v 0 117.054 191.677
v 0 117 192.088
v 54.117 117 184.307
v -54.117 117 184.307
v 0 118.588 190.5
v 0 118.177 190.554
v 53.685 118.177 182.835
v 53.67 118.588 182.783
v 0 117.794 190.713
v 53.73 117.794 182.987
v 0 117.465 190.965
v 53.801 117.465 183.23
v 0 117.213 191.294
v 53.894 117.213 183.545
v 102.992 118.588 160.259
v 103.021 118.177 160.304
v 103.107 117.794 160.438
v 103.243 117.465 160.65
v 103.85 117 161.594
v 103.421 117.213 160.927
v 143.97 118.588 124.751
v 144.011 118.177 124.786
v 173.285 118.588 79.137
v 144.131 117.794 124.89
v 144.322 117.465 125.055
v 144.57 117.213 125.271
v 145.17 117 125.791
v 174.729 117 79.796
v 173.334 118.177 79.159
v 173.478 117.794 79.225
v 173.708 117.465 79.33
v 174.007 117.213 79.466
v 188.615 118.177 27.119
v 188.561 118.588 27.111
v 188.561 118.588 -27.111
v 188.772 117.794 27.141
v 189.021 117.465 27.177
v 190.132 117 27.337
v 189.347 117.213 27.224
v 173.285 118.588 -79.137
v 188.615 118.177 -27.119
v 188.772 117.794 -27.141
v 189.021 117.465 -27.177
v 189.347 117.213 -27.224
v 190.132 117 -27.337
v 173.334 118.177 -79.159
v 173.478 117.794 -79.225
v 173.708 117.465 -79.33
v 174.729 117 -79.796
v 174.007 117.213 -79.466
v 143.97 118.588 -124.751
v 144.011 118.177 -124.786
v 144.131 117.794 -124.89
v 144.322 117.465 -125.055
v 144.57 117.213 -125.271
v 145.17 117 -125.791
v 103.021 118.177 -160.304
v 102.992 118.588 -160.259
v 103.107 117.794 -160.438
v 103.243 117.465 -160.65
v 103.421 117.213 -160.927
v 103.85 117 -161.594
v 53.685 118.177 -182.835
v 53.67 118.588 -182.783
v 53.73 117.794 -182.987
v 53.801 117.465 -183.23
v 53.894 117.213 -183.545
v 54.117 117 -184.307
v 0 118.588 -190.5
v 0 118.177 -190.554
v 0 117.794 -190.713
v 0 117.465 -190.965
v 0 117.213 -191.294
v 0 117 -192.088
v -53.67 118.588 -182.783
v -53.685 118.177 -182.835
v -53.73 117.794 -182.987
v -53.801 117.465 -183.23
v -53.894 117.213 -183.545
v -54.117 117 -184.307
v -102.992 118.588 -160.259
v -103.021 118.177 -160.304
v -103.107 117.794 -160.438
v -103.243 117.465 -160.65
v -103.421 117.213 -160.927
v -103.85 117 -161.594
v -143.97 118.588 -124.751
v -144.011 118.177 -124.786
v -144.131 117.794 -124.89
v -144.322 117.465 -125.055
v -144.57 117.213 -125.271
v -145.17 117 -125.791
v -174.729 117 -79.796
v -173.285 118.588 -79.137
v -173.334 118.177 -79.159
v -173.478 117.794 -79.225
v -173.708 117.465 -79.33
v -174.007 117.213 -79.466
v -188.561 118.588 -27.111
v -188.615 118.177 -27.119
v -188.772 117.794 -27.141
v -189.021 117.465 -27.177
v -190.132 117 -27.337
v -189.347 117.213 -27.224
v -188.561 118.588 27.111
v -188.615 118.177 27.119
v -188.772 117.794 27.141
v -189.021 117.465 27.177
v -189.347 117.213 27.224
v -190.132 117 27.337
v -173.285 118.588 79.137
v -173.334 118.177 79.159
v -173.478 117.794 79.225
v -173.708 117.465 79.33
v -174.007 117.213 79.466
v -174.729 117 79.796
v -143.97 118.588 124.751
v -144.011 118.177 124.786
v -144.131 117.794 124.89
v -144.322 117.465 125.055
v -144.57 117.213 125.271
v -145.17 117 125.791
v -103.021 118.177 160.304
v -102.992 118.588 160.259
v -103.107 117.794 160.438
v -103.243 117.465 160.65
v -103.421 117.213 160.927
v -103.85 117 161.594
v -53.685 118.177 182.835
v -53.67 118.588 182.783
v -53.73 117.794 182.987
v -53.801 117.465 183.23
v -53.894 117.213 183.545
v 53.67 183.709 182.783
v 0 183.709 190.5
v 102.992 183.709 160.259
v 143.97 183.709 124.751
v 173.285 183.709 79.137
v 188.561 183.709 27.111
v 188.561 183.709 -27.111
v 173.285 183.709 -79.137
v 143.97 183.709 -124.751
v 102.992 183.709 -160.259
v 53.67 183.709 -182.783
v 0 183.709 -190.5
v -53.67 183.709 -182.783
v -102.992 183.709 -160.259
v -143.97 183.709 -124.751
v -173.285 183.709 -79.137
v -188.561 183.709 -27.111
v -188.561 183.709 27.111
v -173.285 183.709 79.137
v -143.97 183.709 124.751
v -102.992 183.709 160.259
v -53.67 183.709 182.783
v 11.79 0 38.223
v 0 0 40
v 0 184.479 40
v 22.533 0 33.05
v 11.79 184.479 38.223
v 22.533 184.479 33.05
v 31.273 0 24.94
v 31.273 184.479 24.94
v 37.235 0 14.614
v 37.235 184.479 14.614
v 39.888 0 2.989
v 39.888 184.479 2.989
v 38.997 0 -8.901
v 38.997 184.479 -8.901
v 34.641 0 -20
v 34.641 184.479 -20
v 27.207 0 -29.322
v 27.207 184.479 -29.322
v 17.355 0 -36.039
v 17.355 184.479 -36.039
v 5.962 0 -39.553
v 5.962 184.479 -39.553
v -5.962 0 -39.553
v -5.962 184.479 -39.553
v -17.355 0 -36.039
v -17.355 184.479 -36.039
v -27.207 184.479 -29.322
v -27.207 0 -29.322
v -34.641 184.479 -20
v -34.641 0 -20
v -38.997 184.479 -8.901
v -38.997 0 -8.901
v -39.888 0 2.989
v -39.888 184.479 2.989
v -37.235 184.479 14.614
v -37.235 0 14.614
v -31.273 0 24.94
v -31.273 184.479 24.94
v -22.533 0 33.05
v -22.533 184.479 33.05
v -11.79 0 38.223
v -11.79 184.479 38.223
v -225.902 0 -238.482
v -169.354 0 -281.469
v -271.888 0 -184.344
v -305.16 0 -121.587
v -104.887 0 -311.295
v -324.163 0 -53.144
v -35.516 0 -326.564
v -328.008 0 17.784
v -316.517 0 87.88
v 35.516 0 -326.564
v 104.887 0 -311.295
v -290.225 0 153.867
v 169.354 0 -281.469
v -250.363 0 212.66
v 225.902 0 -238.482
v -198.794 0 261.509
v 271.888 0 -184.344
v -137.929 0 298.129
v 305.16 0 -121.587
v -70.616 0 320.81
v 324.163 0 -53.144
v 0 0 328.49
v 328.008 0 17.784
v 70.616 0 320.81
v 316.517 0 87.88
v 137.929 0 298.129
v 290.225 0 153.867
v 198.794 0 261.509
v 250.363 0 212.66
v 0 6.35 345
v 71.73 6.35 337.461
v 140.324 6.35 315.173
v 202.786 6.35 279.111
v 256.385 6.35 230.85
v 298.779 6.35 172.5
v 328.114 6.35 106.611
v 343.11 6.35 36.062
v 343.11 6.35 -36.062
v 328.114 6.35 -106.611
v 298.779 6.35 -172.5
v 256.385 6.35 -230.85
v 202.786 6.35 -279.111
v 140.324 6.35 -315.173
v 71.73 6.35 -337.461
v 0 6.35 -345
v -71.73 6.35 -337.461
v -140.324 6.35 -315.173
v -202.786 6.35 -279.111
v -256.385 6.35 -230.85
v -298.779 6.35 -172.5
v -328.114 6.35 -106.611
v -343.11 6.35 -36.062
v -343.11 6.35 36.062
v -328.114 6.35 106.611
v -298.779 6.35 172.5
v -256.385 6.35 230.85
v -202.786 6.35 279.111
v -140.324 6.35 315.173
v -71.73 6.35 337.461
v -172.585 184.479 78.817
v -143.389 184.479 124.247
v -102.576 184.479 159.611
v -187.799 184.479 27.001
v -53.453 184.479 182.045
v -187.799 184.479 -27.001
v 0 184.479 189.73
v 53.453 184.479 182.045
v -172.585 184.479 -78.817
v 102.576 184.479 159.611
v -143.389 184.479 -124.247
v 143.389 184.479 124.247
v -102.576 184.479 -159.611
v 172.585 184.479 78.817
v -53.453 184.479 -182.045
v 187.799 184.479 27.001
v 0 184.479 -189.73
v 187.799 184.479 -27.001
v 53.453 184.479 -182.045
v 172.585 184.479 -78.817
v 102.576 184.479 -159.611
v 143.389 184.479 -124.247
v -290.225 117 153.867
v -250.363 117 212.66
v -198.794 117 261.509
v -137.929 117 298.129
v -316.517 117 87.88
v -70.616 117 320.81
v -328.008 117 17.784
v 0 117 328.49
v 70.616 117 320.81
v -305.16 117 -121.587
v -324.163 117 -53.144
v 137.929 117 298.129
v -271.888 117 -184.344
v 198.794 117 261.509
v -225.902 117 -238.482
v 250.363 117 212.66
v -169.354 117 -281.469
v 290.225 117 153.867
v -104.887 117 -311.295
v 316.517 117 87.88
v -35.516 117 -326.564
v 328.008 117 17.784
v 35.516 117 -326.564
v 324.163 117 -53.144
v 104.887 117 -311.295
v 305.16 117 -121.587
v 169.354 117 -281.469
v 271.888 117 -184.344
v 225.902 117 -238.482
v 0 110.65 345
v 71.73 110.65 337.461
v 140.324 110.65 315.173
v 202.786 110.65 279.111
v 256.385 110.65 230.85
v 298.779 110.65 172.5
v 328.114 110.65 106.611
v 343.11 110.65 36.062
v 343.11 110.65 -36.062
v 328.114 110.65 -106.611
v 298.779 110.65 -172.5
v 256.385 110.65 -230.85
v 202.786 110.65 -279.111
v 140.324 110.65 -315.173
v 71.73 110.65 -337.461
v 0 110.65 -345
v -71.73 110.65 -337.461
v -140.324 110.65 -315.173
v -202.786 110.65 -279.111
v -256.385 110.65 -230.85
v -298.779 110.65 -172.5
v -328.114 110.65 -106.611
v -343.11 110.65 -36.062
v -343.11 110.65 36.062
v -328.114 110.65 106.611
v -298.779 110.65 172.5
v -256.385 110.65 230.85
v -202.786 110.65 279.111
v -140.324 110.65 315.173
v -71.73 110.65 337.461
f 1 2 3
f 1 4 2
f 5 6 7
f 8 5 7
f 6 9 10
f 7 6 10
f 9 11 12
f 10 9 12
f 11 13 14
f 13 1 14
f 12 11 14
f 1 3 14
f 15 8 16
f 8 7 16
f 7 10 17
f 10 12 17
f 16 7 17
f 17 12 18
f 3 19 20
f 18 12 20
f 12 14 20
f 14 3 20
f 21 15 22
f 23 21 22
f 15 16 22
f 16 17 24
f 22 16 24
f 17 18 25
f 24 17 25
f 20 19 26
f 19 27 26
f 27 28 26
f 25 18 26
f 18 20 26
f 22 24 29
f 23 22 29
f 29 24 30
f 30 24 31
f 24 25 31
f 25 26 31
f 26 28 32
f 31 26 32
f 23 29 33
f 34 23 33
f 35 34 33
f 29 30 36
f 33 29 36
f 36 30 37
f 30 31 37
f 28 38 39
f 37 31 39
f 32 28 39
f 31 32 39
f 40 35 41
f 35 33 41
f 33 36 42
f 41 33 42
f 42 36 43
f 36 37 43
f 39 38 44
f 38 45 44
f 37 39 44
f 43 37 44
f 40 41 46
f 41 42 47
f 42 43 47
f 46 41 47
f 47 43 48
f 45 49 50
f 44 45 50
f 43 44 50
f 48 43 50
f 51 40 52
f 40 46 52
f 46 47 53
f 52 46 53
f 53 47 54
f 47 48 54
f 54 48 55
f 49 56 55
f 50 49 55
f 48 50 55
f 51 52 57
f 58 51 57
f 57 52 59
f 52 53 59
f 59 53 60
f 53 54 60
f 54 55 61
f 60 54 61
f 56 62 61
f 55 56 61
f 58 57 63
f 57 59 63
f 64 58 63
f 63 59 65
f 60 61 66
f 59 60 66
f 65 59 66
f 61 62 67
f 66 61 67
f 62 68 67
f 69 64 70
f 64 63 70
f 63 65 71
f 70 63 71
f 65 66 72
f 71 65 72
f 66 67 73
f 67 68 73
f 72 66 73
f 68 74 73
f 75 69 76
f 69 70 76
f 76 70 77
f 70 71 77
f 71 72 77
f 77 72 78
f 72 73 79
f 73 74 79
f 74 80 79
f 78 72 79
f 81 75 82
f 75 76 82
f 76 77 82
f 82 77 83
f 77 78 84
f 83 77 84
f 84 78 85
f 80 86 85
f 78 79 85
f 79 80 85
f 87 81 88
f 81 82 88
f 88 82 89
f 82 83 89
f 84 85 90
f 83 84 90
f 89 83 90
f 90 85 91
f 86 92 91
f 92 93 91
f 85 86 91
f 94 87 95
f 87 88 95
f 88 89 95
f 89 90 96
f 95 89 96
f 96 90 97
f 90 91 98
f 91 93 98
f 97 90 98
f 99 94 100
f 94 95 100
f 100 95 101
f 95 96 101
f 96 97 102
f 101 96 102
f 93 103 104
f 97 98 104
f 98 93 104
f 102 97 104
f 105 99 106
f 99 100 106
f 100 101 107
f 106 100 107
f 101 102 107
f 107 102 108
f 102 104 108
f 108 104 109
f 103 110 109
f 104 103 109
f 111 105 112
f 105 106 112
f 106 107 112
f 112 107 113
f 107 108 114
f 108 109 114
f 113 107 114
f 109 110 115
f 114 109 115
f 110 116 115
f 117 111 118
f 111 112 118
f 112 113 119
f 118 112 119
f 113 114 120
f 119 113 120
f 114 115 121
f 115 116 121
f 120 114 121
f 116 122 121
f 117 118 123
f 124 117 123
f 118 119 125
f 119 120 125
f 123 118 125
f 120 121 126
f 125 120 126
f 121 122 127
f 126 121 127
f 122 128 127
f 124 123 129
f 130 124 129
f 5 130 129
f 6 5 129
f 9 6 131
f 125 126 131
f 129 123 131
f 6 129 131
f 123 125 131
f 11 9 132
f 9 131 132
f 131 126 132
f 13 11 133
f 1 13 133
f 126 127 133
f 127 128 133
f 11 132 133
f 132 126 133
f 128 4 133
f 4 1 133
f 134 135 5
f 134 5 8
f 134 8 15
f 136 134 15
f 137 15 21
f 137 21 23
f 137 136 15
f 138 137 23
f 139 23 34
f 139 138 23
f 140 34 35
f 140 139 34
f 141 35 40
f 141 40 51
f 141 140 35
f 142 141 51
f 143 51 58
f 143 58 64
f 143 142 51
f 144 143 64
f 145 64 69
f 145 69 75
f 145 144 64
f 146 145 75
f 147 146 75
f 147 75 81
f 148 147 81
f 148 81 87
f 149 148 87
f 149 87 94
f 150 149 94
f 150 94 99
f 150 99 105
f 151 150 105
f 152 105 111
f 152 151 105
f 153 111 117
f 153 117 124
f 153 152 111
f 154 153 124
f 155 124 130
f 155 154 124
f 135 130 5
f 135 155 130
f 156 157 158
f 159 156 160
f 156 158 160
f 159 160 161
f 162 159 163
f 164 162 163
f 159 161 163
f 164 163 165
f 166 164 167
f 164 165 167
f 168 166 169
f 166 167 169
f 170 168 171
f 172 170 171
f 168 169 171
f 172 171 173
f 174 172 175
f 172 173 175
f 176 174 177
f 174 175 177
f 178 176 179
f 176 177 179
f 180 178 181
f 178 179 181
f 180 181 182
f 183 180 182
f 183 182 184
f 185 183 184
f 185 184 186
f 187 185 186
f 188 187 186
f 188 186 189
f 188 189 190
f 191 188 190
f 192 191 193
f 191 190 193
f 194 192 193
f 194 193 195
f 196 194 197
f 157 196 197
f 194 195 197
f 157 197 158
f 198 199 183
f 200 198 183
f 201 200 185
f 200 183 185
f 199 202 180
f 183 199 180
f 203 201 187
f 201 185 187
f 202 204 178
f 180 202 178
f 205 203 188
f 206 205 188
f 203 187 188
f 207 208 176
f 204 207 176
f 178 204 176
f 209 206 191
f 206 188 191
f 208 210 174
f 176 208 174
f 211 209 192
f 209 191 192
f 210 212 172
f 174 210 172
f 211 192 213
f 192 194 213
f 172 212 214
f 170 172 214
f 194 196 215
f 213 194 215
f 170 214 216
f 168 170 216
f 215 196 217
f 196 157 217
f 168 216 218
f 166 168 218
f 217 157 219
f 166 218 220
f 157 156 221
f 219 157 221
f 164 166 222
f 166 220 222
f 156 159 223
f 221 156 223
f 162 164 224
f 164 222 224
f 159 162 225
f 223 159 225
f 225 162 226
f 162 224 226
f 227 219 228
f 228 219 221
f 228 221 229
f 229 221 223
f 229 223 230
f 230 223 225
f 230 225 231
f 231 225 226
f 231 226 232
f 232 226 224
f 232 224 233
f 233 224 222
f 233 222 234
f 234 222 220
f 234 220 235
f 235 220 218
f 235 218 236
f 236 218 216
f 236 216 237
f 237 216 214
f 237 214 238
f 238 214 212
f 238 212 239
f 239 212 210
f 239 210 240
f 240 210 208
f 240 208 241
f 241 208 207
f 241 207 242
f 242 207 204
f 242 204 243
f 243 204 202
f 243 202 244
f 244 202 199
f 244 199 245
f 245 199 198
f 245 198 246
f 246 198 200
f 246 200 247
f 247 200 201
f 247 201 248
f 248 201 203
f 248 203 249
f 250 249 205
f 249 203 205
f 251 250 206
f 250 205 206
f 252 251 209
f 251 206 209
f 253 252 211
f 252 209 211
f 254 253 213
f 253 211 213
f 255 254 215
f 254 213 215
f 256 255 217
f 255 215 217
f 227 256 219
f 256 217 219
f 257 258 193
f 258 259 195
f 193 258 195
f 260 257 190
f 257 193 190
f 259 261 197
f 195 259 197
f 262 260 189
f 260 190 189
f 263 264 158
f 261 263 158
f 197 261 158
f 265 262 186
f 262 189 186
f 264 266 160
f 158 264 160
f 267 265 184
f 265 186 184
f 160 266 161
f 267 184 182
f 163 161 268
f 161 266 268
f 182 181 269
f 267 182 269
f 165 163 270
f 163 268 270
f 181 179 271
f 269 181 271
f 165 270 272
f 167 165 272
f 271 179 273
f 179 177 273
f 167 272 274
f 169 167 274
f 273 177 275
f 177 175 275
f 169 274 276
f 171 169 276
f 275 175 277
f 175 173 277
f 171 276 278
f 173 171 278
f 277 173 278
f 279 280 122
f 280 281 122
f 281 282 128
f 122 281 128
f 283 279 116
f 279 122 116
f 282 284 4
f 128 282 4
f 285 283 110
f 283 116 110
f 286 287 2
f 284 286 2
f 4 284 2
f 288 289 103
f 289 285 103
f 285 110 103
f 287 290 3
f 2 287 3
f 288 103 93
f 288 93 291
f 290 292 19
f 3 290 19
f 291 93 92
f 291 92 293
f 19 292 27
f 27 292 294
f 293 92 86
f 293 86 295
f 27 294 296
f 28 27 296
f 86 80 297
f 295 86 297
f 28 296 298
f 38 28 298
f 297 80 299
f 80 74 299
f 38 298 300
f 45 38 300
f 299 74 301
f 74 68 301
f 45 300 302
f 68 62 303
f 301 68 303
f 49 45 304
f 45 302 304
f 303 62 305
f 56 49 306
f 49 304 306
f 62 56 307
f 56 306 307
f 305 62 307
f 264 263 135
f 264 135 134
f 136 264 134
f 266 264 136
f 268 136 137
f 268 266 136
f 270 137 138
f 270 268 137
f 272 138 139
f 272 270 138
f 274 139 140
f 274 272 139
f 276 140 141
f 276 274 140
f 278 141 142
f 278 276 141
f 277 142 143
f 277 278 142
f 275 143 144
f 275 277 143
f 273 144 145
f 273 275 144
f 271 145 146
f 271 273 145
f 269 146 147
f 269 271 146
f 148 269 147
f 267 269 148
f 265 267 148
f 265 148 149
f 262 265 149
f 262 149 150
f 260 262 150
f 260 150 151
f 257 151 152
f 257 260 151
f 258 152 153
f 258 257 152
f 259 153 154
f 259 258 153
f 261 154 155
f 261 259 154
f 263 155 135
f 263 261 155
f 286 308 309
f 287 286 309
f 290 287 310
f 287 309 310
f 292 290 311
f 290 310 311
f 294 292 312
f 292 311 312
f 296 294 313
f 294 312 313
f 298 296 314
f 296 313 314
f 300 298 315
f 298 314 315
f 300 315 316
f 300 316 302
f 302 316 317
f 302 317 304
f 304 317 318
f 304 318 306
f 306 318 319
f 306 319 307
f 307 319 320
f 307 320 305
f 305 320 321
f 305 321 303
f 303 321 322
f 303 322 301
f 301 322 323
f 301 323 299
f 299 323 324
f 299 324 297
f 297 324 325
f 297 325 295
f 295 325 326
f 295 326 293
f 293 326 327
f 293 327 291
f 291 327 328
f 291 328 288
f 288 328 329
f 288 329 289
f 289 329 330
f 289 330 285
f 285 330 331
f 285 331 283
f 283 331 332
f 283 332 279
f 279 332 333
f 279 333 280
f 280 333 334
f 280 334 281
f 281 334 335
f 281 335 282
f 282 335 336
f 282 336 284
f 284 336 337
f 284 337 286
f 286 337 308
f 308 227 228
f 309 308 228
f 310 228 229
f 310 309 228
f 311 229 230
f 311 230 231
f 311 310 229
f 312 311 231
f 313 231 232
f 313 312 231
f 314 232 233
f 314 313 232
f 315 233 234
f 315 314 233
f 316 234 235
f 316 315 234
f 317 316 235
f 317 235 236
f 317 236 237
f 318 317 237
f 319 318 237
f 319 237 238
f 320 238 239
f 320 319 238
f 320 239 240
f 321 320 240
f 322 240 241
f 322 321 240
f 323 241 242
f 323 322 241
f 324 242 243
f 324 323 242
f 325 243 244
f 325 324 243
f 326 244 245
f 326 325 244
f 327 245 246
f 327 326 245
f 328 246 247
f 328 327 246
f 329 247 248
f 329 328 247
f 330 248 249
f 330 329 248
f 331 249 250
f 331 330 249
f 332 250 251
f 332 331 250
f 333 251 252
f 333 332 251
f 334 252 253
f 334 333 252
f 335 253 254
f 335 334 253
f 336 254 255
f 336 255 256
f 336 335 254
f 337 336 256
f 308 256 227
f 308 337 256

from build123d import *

# Parameters (mm, degrees)
F0_W        = 117
F0_H        = 154.5
F0_H_2      = 150.5
F0_W_2      = 67.4791876724
F2_R        = 1.5875
F3_SIZE     = 0.7696969697
F4_C1_SIZE2 = 6.35
F4_C1_SIZE  = 16.51
F4_C2_SIZE2 = 16.51
F4_C2_SIZE  = 6.35


with BuildPart() as f1:
    # F0 (on Right) → F1 (revolve)
    with BuildSketch(Plane.YZ):
        with Locations((58.5, 267.75)):
            Rectangle(F0_W, F0_H)
        with Locations((58.5, 115.25)):
            Rectangle(F0_W, F0_H_2)
        with Locations((150.7395938362, 115.25)):
            Rectangle(F0_W_2, F0_H_2)
    revolve(axis=Axis((0, 115.410885826, 0), (0, 1, 0)))

    # F2
    f2_edges = [f1.edges().sort_by_distance(p)[0] for p in [
        (0, 117, -190.5),
    ]]
    fillet(f2_edges, radius=F2_R)

    # F3
    f3_edges = [f1.edges().sort_by_distance(p)[0] for p in [
        (0, 184.479188, -190.5),
    ]]
    chamfer(f3_edges, length=F3_SIZE)

    # F4: chamfer of 6.35 x 16.51 on 4 edges, made by hand

    # F4_c1
    f4_c1_edges = [f1.edges().sort_by_distance(p)[0] for p in [
        (0, 117, -345),
    ]]
    f4_c1_side = f1.faces().sort_by_distance((0, 117, -344.873))[0]
    chamfer(f4_c1_edges, length=F4_C1_SIZE, length2=F4_C1_SIZE2, reference=f4_c1_side)

    # F4_c2
    f4_c2_edges = [f1.edges().sort_by_distance(p)[0] for p in [
        (0, 0, -345),
    ]]
    f4_c2_side = f1.faces().sort_by_distance((0, 0.127, -345))[0]
    chamfer(f4_c2_edges, length=F4_C2_SIZE, length2=F4_C2_SIZE2, reference=f4_c2_side)


solid = f1.part
